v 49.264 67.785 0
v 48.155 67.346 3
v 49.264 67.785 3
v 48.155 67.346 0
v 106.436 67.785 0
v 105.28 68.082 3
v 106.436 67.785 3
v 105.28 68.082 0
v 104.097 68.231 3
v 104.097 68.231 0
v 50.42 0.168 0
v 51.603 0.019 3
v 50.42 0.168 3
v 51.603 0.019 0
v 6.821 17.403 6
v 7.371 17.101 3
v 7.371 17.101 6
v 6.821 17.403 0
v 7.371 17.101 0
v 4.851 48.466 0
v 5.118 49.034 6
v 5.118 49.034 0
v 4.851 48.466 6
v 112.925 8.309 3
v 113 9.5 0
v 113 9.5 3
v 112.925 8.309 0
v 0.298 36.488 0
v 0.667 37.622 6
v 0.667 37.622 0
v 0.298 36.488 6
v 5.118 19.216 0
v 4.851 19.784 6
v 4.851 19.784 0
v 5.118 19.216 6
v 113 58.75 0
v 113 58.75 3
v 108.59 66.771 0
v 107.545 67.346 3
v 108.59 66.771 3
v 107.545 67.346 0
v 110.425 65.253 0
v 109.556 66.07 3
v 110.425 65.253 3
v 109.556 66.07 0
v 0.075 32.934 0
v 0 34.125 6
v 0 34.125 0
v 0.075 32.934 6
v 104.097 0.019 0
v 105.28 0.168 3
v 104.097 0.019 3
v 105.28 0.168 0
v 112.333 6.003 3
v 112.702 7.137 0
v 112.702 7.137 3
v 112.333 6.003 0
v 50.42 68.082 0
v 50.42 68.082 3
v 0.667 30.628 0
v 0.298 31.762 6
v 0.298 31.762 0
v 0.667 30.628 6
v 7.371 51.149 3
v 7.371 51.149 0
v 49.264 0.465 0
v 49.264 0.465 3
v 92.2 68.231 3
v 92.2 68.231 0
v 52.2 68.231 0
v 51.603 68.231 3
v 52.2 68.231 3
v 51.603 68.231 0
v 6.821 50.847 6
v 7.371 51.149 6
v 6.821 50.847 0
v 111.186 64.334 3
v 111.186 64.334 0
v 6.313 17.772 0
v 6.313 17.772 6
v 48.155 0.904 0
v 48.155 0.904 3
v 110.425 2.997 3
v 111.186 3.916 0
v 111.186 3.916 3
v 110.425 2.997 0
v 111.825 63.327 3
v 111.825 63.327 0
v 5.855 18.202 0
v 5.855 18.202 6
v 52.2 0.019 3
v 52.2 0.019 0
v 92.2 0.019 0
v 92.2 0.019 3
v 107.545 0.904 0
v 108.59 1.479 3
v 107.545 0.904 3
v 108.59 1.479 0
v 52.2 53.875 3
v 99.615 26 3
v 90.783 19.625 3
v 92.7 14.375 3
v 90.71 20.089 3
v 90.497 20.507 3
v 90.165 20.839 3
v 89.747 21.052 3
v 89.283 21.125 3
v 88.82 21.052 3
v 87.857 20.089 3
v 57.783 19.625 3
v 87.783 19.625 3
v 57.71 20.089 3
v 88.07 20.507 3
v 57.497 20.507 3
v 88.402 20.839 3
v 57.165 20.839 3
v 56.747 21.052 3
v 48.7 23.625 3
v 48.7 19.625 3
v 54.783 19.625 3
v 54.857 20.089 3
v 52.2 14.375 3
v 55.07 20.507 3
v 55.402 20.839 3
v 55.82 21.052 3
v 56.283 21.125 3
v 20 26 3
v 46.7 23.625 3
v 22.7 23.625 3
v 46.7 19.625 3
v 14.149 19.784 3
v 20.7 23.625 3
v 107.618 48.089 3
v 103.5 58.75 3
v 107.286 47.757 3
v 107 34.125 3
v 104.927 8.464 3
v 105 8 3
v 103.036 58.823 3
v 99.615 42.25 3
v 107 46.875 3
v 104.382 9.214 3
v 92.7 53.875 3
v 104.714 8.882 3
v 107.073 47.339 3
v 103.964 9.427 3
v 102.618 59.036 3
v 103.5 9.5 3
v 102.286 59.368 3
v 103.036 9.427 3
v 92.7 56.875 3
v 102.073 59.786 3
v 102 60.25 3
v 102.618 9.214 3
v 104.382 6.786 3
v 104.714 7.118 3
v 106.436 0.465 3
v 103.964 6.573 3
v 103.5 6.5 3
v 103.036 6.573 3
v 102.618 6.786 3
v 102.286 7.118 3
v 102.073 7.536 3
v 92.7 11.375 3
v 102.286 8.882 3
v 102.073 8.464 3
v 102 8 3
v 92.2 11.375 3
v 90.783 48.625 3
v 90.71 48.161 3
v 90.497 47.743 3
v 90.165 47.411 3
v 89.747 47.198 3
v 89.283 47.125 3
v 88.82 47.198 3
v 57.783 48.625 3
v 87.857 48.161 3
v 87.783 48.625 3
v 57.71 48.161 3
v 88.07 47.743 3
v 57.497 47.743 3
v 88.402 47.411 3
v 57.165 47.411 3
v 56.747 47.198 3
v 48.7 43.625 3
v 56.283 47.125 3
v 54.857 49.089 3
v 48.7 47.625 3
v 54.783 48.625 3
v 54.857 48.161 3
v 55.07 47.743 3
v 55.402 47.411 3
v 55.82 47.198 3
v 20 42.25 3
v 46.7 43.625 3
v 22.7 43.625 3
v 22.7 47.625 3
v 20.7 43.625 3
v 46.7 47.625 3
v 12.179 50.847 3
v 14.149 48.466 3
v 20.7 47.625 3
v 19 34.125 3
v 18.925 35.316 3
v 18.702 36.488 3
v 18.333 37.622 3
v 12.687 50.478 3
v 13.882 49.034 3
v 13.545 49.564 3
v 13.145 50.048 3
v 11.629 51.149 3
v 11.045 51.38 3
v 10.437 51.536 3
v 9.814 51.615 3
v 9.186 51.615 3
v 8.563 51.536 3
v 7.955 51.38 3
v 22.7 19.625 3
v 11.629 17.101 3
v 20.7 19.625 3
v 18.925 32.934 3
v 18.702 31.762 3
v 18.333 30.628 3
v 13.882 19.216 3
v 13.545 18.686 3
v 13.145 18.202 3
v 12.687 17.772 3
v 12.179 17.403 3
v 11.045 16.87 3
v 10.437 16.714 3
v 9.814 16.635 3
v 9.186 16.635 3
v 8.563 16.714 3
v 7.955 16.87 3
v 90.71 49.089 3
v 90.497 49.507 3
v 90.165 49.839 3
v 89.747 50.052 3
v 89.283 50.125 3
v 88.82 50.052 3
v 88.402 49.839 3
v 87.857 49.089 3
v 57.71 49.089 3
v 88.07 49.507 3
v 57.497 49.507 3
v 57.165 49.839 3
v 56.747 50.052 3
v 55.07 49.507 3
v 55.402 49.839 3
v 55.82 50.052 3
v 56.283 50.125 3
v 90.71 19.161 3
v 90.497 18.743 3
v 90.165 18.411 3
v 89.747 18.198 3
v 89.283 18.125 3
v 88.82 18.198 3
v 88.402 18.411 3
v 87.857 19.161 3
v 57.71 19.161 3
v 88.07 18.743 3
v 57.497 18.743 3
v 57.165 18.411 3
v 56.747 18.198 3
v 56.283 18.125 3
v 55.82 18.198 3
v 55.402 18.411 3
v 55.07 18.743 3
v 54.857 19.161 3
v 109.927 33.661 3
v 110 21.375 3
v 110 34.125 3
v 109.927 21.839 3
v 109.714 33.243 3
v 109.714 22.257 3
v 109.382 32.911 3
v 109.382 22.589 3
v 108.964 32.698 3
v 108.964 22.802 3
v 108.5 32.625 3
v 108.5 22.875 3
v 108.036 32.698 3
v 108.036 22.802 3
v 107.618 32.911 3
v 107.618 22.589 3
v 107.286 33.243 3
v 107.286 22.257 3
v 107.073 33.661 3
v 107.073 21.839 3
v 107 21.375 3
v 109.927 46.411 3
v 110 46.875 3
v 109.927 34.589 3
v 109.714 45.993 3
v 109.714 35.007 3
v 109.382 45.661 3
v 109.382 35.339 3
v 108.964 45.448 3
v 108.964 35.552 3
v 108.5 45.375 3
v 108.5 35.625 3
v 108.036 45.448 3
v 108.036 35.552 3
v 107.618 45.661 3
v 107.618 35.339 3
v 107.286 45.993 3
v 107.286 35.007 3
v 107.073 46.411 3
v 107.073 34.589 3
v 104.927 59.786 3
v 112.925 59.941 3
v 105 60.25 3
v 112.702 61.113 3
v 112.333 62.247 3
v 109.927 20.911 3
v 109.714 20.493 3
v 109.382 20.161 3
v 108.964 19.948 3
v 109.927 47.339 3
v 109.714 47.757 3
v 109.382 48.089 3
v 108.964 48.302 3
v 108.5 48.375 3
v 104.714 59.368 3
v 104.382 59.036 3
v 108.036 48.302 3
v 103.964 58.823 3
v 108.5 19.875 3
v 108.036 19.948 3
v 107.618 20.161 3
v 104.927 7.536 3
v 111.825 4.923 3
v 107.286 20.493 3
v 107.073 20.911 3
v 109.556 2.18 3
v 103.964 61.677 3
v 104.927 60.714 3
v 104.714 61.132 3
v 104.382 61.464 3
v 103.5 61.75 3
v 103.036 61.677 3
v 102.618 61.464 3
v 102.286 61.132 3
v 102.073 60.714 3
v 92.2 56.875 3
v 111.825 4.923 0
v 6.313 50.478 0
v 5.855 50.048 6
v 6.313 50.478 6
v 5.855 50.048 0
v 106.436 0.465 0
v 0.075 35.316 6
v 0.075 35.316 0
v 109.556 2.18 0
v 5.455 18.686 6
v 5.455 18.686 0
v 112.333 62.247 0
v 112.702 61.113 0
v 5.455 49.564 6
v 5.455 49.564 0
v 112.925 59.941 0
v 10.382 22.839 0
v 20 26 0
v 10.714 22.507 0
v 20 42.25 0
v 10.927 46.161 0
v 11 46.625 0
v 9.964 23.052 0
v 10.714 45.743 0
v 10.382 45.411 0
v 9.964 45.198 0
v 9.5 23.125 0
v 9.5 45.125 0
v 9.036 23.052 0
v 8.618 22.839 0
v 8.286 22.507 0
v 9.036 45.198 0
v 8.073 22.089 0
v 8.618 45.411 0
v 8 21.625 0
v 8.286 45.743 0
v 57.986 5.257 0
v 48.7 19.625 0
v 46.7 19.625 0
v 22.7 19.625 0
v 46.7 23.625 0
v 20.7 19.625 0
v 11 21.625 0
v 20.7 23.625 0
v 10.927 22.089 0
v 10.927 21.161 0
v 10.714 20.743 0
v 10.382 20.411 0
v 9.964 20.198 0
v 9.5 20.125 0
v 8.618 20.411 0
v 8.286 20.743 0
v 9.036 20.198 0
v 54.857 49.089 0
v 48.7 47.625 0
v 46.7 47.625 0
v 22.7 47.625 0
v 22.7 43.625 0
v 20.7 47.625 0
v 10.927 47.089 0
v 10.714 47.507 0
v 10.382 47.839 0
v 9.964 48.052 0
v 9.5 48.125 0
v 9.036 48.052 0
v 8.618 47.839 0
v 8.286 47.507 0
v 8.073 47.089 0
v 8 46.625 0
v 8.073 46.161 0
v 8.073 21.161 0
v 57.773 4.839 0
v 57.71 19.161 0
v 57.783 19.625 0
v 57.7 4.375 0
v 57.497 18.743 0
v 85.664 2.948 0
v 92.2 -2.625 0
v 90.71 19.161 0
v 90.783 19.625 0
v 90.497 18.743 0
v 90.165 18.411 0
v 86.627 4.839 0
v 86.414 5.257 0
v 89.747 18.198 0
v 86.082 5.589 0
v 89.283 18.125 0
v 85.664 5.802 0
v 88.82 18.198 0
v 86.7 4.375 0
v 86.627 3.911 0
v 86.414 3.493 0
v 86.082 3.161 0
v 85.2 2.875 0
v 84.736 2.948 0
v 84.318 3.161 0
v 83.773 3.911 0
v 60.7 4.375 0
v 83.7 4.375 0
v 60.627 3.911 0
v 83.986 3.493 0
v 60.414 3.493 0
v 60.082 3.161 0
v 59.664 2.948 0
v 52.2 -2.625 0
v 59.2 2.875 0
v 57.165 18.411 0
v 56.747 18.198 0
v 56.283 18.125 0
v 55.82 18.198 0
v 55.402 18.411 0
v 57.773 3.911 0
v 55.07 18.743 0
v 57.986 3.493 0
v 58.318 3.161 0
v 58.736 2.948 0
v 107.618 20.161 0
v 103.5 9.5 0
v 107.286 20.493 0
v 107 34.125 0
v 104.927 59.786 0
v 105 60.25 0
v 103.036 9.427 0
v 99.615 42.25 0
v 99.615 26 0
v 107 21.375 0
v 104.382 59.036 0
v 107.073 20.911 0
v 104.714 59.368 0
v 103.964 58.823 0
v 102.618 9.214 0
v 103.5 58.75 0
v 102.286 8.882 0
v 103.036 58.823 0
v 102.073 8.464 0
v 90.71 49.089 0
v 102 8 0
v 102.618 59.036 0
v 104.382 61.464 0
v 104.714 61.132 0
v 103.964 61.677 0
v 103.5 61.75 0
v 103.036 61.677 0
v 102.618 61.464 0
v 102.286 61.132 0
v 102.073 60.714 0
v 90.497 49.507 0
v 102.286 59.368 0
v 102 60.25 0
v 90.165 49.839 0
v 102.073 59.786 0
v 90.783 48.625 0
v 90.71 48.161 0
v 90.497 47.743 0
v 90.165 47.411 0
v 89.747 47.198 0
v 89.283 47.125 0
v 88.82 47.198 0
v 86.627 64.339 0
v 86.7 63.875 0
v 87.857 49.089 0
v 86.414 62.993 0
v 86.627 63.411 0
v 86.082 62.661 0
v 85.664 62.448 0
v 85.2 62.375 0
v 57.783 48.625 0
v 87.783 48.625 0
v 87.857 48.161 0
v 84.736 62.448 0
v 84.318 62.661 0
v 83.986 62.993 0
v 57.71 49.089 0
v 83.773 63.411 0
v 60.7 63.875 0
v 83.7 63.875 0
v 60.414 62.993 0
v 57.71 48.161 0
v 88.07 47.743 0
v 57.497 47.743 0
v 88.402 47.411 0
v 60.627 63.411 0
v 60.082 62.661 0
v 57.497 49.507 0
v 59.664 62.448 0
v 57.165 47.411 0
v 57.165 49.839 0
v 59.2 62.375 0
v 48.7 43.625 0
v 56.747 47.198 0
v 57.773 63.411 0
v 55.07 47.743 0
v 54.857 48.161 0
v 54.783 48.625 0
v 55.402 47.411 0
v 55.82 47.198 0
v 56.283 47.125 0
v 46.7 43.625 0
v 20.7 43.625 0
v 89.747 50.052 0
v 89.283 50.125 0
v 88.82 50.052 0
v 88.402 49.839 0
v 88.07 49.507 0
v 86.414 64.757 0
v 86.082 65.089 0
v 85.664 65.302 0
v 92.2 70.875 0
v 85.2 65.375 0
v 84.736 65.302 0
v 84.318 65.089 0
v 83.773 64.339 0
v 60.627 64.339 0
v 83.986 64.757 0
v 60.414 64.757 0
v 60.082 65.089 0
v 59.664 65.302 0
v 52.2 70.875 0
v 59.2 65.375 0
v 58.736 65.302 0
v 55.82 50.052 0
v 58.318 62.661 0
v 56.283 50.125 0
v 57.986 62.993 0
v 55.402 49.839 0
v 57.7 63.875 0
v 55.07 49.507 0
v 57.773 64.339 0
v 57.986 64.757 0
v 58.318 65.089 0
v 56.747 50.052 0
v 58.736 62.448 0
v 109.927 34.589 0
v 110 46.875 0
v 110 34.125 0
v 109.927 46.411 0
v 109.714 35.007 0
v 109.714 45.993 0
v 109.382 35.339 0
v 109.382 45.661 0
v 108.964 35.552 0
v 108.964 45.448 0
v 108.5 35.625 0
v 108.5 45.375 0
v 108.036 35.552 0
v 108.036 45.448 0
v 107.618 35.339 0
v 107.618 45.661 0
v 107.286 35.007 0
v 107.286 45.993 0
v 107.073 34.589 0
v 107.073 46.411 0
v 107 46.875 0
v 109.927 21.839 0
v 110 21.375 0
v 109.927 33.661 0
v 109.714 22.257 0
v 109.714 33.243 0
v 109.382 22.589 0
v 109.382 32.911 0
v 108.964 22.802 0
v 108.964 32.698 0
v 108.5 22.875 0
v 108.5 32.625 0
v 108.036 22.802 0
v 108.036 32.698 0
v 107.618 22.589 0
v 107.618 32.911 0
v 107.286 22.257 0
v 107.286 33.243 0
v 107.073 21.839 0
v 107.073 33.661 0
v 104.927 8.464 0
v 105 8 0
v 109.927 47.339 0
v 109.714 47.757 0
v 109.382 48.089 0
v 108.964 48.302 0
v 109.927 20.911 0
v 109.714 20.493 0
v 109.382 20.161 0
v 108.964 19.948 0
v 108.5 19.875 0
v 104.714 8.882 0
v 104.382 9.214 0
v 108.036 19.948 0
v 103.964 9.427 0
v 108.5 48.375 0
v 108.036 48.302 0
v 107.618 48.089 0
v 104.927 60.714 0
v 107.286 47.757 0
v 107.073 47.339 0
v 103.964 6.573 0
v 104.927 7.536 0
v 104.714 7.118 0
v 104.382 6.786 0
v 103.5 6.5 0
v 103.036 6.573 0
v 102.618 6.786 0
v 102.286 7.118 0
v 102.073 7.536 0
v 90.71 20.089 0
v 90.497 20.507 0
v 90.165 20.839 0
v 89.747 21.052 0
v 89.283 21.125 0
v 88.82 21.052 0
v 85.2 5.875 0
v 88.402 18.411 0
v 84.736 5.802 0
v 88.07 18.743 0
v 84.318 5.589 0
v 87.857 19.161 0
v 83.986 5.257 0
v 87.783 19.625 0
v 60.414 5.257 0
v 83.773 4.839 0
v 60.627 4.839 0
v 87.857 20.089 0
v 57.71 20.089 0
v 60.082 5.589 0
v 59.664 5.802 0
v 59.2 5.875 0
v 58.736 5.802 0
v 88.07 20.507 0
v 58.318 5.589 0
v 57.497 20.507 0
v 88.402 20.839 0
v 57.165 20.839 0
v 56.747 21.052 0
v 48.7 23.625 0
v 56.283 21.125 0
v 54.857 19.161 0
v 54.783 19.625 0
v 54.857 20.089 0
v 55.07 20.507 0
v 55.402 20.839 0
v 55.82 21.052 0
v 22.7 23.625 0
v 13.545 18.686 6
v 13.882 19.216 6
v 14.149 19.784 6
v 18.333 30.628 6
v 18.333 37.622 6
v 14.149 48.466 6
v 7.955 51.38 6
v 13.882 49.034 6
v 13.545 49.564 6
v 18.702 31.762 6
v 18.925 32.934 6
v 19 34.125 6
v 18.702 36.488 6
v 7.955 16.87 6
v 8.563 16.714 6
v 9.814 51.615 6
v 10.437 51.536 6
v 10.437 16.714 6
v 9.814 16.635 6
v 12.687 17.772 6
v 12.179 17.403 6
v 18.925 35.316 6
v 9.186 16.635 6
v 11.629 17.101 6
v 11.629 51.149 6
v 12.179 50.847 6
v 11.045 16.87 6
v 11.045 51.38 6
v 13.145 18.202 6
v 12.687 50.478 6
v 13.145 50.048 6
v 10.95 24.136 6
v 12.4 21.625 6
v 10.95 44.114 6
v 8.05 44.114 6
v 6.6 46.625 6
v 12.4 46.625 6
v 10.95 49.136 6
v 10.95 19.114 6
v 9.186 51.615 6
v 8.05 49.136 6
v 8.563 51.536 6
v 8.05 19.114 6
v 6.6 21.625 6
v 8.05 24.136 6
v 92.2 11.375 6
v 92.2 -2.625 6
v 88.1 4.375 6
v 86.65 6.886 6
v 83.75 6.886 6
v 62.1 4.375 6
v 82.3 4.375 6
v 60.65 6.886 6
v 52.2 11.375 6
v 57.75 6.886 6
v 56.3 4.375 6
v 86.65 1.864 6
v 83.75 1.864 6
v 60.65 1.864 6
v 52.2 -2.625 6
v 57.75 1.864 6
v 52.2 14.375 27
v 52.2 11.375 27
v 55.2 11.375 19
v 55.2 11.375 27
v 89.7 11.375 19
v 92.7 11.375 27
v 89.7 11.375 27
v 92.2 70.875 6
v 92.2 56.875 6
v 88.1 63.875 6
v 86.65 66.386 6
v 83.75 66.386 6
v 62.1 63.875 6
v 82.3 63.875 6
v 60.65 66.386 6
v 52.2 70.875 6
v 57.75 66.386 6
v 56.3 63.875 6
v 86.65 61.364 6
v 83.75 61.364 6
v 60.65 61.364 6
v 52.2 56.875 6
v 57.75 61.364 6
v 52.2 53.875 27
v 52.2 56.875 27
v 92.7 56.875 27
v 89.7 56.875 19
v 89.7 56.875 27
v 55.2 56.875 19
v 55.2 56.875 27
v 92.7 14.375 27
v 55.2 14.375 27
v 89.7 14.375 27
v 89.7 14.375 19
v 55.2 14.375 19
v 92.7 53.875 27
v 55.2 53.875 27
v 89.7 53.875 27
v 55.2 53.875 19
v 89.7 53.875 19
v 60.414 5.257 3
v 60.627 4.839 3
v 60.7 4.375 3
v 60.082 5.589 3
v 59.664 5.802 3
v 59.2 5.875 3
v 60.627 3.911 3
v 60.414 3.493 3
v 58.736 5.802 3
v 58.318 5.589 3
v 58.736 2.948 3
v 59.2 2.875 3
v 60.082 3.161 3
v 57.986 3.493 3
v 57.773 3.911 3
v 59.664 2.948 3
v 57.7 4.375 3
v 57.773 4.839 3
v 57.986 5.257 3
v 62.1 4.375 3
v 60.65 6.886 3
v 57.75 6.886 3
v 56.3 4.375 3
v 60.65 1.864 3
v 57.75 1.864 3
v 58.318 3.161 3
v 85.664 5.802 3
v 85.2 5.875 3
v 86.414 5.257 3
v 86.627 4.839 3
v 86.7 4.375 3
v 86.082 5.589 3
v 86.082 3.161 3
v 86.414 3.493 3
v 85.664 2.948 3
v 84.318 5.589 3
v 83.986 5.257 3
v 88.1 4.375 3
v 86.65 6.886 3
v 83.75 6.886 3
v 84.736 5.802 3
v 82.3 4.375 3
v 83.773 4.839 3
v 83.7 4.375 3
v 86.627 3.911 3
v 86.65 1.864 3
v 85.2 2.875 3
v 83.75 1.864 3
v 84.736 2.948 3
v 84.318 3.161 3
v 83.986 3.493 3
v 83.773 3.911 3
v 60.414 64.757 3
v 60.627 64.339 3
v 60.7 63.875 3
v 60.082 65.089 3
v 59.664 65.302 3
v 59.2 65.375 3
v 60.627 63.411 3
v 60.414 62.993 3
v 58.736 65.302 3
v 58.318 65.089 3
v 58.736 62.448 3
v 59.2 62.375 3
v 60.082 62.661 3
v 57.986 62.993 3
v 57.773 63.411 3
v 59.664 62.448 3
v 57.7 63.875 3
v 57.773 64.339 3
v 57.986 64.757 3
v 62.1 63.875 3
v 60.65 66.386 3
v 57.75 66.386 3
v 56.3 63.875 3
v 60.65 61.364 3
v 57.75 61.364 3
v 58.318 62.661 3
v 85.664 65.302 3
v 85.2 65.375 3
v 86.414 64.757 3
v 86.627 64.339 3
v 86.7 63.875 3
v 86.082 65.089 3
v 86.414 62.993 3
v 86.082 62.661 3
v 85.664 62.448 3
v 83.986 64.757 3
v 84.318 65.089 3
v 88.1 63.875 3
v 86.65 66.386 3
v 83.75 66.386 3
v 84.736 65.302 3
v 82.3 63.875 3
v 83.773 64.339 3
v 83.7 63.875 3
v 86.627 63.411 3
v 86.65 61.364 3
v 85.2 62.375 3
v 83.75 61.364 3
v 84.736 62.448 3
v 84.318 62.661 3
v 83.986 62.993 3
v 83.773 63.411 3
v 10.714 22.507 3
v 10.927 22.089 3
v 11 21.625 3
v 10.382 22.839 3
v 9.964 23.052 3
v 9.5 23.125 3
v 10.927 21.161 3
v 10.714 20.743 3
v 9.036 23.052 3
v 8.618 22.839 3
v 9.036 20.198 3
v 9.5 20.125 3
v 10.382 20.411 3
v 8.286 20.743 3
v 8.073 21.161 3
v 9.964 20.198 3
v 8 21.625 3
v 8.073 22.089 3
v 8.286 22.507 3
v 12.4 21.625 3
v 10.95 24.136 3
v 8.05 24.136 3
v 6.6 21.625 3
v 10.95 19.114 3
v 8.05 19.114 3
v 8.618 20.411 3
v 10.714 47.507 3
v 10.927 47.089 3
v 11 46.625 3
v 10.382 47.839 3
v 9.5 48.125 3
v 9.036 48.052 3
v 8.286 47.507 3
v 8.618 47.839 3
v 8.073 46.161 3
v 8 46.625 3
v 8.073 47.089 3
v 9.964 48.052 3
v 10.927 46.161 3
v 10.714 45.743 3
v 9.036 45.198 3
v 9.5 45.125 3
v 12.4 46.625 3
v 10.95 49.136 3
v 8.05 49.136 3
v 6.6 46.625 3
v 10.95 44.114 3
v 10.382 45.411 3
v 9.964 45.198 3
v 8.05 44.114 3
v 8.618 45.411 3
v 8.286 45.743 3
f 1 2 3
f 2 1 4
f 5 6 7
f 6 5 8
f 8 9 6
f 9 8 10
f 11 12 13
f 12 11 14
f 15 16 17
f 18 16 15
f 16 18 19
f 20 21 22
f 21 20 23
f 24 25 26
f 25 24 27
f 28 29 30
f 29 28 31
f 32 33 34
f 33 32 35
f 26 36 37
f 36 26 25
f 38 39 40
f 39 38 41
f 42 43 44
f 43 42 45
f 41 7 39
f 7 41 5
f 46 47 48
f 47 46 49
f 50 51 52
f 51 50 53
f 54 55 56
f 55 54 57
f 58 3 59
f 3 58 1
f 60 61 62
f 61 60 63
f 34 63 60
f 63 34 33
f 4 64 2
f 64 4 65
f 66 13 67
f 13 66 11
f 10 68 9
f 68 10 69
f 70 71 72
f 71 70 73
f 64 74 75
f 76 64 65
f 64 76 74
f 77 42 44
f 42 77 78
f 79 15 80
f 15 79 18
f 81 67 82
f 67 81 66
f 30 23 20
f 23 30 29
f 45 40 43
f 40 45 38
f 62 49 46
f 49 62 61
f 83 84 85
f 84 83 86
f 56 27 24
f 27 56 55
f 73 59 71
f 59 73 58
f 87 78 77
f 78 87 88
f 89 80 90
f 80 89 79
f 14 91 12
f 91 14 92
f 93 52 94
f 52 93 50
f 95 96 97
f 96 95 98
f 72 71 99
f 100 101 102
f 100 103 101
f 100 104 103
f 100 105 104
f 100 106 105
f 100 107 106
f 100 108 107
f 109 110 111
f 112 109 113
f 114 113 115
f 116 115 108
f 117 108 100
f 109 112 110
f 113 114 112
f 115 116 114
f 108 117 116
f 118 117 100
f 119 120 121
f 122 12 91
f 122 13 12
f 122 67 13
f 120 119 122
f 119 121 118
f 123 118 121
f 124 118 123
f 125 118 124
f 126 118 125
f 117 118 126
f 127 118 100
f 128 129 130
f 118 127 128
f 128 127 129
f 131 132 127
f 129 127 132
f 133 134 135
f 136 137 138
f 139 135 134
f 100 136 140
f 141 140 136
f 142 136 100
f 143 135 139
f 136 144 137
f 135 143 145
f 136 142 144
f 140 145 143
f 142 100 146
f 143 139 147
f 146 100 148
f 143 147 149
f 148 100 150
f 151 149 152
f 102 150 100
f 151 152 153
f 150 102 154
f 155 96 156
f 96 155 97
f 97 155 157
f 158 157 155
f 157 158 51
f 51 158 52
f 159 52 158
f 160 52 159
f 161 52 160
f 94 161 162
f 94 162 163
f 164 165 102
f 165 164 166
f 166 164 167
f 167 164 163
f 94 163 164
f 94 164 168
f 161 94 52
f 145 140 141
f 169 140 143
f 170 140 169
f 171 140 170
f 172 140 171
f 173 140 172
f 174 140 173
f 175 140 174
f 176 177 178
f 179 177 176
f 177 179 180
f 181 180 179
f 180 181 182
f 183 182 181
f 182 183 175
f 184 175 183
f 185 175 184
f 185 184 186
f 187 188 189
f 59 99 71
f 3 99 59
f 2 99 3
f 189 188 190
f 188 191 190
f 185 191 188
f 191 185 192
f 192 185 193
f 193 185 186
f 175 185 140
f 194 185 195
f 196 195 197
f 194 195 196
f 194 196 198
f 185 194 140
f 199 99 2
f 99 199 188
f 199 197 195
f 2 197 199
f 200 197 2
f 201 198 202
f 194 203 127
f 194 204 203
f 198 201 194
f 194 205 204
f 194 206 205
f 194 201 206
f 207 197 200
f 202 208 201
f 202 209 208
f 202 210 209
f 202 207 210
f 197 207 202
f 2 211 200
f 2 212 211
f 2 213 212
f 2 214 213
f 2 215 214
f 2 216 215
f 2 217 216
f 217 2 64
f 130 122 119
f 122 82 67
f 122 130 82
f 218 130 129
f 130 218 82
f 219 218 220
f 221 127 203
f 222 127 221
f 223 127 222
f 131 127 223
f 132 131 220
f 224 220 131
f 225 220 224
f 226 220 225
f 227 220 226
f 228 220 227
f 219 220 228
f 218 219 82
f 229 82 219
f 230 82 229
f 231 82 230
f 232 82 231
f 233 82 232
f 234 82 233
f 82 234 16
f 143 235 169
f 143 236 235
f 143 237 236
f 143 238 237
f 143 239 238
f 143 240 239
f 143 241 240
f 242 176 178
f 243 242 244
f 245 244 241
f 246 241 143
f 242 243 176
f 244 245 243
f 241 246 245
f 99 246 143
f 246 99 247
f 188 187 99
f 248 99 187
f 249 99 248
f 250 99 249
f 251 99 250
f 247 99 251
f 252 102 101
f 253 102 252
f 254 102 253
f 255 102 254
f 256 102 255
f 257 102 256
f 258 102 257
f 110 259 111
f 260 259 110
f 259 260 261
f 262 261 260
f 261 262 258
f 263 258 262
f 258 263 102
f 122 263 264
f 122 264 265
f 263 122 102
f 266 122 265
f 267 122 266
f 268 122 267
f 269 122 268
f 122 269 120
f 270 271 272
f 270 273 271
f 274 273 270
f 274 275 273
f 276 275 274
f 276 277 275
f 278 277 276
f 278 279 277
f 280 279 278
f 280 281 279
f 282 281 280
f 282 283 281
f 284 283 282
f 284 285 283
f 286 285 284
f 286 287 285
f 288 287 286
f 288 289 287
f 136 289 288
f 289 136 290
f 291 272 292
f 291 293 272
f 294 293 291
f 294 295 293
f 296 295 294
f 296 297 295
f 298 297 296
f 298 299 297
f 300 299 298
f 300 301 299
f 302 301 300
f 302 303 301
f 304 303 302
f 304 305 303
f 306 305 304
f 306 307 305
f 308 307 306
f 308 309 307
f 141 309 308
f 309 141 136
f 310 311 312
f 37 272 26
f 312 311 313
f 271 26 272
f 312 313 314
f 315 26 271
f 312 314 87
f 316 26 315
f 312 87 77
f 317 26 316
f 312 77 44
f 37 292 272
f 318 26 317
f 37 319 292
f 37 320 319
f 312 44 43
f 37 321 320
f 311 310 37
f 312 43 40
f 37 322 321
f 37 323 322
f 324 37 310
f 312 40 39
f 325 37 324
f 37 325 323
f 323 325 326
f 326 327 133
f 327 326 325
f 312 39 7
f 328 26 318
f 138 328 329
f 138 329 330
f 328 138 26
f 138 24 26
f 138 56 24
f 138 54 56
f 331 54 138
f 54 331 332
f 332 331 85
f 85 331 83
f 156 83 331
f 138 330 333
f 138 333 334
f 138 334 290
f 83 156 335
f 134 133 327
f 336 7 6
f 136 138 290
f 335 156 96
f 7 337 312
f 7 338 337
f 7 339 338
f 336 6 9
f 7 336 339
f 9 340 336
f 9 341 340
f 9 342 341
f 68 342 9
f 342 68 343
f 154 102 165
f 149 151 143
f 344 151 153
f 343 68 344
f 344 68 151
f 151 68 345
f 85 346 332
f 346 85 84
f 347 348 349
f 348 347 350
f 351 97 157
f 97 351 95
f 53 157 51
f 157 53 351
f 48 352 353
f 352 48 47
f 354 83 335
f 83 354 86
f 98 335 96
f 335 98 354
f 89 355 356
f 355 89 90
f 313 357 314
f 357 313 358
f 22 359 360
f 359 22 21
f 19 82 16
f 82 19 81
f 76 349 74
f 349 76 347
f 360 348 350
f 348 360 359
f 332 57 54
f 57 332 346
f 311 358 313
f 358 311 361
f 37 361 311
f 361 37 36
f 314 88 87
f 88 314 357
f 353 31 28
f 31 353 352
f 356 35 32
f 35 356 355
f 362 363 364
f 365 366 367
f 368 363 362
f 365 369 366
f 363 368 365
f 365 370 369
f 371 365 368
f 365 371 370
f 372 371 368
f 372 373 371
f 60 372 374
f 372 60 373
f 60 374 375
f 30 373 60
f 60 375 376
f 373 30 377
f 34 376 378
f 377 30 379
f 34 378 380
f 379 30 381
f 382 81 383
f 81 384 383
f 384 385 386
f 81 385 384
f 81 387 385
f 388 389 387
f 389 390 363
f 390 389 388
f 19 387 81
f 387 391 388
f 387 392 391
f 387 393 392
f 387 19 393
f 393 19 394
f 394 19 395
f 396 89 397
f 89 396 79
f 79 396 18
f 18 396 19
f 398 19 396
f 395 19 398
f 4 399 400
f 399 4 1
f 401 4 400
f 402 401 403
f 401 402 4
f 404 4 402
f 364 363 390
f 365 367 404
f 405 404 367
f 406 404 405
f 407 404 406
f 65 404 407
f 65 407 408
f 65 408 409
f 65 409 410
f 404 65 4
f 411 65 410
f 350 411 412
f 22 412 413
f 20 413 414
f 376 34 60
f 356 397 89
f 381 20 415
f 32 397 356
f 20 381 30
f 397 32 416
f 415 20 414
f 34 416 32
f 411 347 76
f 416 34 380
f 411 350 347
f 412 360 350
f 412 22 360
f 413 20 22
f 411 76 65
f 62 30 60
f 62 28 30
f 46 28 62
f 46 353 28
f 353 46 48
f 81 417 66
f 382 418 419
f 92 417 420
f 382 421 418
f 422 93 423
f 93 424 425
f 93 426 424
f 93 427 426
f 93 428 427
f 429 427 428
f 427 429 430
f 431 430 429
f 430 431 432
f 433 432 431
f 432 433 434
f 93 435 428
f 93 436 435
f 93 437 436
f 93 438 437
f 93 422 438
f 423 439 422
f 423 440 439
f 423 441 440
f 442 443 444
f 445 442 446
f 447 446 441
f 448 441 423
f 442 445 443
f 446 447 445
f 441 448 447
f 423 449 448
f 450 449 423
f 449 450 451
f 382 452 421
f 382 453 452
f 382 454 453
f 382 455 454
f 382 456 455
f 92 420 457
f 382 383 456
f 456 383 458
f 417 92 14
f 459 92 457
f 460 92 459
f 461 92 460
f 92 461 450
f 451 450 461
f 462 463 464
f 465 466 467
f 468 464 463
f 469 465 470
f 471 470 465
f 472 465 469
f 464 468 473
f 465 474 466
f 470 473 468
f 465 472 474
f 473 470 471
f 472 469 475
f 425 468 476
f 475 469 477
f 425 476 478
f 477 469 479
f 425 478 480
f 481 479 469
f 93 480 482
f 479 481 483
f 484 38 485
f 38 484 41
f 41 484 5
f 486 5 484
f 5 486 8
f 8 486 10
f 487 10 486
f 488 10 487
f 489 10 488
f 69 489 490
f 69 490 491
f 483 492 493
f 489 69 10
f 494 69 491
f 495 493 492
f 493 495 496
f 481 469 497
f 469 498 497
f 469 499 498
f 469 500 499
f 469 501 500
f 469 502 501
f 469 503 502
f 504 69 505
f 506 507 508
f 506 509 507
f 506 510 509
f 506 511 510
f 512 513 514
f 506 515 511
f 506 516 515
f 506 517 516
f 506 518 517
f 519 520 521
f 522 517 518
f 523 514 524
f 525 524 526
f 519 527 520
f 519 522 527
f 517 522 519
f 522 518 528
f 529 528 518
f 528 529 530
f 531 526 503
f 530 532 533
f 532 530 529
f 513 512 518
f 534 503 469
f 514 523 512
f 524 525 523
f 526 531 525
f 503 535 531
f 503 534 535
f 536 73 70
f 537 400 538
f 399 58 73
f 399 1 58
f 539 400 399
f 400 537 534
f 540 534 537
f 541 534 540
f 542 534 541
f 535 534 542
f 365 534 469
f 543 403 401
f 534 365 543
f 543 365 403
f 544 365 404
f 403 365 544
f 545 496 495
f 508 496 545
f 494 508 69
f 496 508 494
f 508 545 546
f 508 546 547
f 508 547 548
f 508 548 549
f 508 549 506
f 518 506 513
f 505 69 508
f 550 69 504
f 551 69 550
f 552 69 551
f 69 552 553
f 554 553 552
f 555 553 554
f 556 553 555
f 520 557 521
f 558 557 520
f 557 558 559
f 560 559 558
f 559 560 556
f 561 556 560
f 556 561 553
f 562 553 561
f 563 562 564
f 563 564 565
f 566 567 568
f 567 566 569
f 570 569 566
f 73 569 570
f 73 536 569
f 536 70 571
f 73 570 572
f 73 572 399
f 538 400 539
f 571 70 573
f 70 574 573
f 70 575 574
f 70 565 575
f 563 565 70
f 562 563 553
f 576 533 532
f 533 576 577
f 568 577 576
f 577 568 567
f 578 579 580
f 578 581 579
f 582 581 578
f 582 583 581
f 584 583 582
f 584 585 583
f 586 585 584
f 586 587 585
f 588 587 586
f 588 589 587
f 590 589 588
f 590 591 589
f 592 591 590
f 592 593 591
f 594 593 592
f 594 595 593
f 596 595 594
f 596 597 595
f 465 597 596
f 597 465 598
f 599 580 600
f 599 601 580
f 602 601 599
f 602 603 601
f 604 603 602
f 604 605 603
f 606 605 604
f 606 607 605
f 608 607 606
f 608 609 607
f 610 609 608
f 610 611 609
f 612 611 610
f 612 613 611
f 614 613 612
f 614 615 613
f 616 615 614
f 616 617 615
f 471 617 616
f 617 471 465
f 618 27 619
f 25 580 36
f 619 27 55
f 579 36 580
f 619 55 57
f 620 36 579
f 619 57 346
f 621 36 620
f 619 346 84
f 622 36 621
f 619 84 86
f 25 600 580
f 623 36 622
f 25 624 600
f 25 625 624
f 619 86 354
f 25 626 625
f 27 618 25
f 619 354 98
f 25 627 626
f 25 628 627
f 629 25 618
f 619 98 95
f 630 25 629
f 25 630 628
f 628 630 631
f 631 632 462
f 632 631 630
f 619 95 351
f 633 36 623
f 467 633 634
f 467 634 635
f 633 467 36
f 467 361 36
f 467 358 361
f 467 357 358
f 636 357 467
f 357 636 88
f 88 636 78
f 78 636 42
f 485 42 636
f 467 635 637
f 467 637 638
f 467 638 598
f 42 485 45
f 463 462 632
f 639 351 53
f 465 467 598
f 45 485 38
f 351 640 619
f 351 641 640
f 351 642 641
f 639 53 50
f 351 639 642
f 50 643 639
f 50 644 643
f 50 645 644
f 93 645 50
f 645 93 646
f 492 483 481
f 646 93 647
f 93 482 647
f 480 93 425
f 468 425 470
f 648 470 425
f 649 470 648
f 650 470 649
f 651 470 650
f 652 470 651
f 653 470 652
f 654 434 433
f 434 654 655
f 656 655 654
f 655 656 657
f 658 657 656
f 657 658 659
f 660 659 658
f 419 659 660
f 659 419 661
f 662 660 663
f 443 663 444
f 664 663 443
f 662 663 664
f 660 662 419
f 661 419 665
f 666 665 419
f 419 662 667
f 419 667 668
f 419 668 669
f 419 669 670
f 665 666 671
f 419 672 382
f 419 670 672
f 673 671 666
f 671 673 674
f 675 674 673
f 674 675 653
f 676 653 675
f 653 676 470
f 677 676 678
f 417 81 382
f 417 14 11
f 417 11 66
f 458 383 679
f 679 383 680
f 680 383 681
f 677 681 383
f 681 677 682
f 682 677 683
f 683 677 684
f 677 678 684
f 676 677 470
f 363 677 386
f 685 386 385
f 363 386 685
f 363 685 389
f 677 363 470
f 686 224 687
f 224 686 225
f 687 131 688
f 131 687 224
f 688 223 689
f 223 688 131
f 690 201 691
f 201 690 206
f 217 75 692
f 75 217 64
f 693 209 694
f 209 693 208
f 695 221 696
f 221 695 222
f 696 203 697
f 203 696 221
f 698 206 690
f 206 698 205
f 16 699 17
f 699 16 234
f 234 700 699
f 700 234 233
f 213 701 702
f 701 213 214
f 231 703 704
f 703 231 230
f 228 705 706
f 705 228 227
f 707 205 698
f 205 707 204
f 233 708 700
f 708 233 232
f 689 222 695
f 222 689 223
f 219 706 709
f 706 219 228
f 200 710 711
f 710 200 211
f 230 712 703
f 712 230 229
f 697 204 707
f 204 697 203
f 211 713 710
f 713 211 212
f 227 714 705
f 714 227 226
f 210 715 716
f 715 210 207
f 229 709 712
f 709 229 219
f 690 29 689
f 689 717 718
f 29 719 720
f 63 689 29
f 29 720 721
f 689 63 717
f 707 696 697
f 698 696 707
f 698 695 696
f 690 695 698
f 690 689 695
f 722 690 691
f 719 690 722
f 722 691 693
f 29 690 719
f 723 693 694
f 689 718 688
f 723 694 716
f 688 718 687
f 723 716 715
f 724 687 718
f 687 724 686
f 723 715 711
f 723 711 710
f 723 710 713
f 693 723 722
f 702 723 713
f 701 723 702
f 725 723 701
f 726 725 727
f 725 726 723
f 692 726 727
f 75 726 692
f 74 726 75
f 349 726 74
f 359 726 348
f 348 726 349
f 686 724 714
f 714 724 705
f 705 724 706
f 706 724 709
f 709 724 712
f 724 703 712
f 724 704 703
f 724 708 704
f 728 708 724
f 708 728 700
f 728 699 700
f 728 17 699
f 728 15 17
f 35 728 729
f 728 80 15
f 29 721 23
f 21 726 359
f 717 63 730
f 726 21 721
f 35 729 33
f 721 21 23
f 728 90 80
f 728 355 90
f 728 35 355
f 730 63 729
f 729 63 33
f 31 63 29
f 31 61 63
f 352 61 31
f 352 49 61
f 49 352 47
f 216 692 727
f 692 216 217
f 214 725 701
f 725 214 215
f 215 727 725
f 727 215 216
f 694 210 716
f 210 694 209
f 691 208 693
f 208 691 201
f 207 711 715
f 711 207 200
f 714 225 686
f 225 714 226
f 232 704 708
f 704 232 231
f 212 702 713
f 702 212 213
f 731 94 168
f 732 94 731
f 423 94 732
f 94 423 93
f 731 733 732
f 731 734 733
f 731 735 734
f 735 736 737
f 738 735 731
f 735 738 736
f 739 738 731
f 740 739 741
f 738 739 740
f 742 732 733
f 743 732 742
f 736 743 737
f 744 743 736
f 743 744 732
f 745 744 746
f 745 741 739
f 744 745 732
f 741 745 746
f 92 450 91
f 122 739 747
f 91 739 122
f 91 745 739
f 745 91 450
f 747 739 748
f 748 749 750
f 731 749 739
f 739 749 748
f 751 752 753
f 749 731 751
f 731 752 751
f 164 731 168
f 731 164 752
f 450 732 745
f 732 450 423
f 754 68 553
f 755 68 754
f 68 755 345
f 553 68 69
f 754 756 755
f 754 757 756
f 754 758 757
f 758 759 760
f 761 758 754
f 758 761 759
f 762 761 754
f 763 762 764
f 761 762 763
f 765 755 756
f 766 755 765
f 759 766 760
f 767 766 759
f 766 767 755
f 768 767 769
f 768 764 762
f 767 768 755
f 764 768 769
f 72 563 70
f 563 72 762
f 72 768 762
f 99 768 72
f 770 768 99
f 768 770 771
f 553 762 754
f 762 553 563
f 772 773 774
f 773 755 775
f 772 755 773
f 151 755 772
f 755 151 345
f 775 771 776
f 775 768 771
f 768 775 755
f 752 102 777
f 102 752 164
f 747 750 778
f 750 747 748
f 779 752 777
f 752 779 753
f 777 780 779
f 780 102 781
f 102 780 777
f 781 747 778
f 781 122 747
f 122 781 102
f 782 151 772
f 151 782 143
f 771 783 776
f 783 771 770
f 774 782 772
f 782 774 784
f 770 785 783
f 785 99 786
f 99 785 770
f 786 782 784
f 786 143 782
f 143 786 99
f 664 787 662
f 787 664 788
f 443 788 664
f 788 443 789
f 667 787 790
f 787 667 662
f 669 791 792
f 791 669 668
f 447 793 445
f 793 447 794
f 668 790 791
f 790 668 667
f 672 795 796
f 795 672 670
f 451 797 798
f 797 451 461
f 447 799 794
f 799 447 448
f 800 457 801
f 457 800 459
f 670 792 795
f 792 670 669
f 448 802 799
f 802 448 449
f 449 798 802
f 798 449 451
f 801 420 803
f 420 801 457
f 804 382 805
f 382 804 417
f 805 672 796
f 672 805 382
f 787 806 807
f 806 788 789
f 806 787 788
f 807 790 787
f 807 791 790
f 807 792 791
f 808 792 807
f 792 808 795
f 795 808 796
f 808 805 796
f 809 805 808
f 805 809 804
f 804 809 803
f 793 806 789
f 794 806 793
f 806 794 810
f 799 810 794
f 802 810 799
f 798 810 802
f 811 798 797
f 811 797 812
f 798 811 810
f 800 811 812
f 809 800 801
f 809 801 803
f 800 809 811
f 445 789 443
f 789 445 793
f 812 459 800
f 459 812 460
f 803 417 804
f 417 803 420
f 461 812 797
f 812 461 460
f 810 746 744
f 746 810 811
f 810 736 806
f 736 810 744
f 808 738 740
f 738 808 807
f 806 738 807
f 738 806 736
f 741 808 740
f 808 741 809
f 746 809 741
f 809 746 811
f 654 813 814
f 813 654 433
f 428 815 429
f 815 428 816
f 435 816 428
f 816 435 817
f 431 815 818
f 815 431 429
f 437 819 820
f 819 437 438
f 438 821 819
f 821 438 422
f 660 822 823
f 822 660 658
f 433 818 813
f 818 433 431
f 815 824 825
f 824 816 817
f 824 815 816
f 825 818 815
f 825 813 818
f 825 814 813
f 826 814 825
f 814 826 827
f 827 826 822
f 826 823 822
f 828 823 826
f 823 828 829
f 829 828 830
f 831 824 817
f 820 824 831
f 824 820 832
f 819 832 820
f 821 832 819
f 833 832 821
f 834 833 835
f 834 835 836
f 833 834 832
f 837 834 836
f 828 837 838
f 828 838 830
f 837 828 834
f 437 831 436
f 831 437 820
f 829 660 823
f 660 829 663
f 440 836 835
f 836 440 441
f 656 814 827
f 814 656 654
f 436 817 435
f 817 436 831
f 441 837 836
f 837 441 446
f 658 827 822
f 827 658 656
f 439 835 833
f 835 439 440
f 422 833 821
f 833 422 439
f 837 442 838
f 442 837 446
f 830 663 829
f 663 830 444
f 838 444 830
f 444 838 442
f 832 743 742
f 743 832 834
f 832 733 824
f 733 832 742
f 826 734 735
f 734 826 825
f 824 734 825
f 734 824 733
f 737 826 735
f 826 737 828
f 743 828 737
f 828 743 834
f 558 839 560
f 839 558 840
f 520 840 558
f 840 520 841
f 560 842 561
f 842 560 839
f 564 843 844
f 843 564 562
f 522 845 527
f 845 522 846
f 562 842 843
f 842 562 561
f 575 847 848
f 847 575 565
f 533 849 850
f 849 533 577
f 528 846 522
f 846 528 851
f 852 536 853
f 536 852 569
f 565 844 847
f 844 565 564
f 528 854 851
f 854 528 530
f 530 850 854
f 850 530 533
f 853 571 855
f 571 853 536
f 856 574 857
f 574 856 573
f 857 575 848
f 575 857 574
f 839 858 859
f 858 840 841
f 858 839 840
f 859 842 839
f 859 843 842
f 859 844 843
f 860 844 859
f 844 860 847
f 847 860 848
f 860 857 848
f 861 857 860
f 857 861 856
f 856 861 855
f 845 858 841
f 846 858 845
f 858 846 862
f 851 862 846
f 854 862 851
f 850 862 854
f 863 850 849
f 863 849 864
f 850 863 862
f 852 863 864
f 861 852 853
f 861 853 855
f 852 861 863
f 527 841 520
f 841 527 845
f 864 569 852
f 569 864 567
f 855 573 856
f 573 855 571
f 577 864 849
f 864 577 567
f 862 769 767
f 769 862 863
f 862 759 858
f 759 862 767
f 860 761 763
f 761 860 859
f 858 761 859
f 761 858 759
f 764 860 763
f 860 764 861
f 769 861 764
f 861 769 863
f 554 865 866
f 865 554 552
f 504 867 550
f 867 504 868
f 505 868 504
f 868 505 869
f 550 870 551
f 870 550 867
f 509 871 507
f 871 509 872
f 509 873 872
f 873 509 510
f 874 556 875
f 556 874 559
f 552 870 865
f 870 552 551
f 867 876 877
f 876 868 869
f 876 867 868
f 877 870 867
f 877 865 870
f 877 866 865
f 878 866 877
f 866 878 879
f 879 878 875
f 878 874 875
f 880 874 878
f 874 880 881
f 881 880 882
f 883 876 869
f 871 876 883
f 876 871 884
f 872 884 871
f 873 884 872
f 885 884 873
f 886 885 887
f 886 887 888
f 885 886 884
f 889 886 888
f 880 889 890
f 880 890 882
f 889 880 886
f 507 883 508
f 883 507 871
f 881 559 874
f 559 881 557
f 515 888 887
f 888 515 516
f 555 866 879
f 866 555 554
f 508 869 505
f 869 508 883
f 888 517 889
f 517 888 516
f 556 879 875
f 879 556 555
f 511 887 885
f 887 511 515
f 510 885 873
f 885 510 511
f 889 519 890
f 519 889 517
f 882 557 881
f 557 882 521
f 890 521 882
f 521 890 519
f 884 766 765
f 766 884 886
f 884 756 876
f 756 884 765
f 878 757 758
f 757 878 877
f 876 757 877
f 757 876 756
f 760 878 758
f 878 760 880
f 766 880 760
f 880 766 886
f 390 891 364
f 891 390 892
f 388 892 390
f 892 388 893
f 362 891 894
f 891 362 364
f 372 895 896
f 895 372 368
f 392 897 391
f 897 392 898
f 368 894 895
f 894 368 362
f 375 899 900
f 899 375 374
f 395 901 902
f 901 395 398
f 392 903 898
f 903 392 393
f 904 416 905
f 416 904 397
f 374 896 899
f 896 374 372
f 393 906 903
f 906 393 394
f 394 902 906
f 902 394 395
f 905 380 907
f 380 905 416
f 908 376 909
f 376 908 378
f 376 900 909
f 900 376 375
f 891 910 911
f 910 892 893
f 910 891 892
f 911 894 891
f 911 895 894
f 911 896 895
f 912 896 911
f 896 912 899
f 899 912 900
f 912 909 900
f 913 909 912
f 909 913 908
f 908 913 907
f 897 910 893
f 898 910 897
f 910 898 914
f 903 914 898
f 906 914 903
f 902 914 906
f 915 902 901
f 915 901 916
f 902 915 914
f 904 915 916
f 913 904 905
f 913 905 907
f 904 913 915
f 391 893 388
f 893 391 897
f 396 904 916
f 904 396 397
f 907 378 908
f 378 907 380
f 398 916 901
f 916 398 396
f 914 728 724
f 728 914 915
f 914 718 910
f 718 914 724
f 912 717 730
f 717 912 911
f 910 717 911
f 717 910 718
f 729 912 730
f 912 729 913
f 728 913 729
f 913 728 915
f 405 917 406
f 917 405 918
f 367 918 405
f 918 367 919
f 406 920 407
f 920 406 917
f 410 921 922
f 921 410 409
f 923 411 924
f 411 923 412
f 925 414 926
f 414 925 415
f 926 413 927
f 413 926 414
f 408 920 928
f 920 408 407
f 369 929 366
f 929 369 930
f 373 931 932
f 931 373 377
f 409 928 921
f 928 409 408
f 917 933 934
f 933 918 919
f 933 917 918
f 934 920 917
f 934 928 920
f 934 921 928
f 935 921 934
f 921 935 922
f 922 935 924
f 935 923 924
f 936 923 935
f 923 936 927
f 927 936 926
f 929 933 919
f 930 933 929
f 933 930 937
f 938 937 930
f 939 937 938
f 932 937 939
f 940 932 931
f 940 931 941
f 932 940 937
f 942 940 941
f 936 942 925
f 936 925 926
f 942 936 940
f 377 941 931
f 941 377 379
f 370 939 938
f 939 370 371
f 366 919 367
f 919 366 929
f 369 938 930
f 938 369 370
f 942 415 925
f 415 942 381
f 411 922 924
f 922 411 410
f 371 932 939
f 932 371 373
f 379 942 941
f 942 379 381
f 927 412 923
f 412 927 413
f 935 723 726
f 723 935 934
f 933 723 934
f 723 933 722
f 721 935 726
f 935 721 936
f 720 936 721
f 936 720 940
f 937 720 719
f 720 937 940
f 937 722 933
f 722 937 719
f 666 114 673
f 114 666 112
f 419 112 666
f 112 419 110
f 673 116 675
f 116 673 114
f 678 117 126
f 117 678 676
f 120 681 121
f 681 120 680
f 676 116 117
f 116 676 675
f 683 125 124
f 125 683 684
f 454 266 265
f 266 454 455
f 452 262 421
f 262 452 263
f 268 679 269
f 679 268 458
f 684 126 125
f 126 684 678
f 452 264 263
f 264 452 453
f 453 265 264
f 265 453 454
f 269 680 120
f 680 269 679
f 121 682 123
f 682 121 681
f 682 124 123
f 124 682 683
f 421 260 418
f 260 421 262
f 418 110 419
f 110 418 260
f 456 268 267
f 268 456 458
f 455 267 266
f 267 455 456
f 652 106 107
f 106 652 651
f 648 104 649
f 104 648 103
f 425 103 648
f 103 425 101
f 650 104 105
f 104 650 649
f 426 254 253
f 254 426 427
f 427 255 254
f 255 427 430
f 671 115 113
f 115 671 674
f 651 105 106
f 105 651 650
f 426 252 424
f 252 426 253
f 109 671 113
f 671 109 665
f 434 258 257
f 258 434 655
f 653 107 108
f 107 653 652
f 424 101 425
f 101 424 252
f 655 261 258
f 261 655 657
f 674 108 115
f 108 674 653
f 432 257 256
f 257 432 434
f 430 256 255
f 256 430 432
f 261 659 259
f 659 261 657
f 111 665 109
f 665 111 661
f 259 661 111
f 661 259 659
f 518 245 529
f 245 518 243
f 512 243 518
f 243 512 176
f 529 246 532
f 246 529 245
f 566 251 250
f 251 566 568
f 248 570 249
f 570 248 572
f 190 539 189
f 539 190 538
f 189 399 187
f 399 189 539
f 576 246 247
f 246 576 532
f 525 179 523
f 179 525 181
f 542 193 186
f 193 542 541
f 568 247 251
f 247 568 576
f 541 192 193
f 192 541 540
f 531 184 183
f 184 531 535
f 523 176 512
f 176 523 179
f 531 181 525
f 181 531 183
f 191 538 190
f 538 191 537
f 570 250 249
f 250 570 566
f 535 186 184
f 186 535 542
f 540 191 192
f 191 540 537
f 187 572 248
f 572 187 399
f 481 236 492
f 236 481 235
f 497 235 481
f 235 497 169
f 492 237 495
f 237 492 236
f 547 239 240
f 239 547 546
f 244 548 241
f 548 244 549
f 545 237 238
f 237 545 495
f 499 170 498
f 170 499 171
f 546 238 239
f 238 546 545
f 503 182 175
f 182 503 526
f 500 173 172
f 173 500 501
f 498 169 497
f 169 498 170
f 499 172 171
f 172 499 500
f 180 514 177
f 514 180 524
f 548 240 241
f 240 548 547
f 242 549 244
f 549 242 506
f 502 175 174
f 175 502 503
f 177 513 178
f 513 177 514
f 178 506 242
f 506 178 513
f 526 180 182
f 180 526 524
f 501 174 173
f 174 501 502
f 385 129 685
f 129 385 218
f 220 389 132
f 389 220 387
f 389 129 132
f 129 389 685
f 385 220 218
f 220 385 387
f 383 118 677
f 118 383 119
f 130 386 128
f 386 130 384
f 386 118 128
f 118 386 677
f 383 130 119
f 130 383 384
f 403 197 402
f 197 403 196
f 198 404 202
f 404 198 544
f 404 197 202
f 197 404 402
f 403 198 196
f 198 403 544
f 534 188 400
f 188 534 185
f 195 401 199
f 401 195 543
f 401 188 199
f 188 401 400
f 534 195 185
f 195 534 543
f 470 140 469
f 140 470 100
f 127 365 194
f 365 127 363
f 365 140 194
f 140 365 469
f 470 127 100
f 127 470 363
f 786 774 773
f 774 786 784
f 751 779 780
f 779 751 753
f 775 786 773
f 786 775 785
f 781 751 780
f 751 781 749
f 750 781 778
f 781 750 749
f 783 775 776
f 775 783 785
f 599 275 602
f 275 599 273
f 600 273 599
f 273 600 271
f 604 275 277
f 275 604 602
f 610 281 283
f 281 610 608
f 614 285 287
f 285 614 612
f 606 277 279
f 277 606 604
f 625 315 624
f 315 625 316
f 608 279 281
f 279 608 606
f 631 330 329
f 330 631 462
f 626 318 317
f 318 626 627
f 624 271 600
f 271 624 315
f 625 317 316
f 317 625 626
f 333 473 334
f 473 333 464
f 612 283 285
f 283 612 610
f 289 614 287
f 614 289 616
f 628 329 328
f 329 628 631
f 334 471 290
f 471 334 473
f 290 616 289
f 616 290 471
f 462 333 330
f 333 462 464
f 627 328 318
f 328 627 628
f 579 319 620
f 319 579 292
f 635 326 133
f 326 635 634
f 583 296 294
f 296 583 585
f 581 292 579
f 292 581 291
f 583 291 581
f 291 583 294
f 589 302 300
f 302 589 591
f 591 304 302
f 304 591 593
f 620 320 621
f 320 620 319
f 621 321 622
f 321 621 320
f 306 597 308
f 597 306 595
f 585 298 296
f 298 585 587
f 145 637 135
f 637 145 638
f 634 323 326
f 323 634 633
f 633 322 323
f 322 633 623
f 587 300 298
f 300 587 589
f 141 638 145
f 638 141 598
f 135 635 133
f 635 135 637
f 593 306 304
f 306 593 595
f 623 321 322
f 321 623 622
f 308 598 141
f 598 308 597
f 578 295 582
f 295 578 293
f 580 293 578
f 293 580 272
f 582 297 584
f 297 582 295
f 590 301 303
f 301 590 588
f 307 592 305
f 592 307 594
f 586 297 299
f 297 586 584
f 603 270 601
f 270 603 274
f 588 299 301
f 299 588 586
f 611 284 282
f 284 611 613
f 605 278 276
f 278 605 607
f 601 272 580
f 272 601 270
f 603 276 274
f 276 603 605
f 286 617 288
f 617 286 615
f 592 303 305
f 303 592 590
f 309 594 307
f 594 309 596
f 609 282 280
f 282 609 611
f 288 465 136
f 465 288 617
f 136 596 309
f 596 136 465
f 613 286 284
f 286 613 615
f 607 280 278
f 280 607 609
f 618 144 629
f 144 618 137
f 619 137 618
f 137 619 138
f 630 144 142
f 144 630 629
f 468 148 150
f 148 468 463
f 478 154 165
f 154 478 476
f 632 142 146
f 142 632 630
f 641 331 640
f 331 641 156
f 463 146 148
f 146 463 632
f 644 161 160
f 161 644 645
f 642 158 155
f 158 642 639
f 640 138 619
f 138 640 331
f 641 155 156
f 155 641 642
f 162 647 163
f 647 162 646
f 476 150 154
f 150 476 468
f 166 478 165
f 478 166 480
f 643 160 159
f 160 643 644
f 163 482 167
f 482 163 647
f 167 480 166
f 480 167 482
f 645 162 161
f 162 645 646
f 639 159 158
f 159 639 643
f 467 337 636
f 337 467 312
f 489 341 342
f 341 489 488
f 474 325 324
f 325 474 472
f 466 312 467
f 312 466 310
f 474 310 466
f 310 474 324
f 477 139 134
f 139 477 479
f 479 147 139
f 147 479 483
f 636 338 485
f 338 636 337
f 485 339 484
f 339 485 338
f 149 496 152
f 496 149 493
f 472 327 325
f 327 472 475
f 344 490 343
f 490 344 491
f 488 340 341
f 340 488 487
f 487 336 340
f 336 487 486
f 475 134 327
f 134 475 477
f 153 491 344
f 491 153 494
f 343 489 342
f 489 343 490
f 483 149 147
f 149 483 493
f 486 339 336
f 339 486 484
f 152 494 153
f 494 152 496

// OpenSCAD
//Espesor paredes
espesor=3;

//porcas M3
radioPorcas=2.9;

//furados de M3
metrica=1.5;

//Dimensions Breadboard
XBreadboard=34.5;
YBreadboard=45.5;
ZBreadboard=9;

//Dimensions plataforma base
XBase=XBreadboard*3;
YBase=YBreadboard*1.5;
ZBase=espesor;
radioCirculos=19/2;
radioCirculosPequenosCaster=5;
separacionFuradosCaster=25;

//Dimensions soportes breadboard
XSoportes=XBreadboard+espesor*2;
YSoportes=espesor;
ZSoportes=24;

//Posición Breadboard
xBreadboard=XBase-XBreadboard*1.4;
yBreadboard=(YBase-YBreadboard)/2;
zBreadboard=ZSoportes+espesor-8;

//Dimensións resaltes
XResalte=40;
YResalte=14;
ZResalte=espesor*2;

//facer os furados do motor con oco para a porca OS FURADOS DO SOPORTE SON GRANDES, RADIO 2
module furadosMotor(){
	union(){
	cylinder(r=metrica, h=espesor,$fn=20);
	translate([0,0,espesor])cylinder(r=radioPorcas,h=espesor*2,$fn=6);
	}
	union(){
	translate ([26,0,0])  cylinder(r=1.5, h=espesor,$fn=20);
	translate([26,0,espesor])cylinder(r=radioPorcas,h=espesor*2,$fn=6);
	}
	}

module furadosCaster(){
	union(){
	cylinder(r=1.5, h=espesor,$fn=20);
	translate([0,0,espesor])cylinder(r=radioPorcas,h=espesor*2,$fn=6);
	}
	union(){
	translate ([0,separacionFuradosCaster,0])  cylinder(r=1.5, h=espesor,$fn=20);
	translate([0,separacionFuradosCaster,espesor])cylinder(r=radioPorcas,h=espesor*2,$fn=6);
	}
	}

module furadosDriver(){

	cylinder(r=1.5, h=espesor,$fn=20);
	translate ([33,0,0])  cylinder(r=1.5, h=espesor,$fn=20);
	translate ([0,29,0])  cylinder(r=1.5, h=espesor,$fn=20);
	translate ([33,29,0])  cylinder(r=1.5, h=espesor,$fn=20);
	}

module furadosPila(){
	cube([2,4,espesor]) ;
	translate ([26,0,0])  cube([2,4,espesor]);
	translate ([0,24,0])  cube([2,4,espesor]);
	translate ([26,24,0])  cube([2,4,espesor]);
	}

module resaltesMotor(){
	difference(){
		cube ([XResalte,YResalte,ZResalte]);
		}
	}

module resalteCaster(){
		hull(){
		cylinder(r=radioCirculos,h=ZResalte,$fn=50);
		translate ([0,separacionFuradosCaster/2,0]) cylinder(r=radioCirculosPequenosCaster,h=ZResalte,$fn=50);
		translate ([0,-separacionFuradosCaster/2,0]) cylinder(r=radioCirculosPequenosCaster,h=ZResalte,$fn=50);
		
		}
	}

module breadboard(){
	cube([XBreadboard,YBreadboard,ZBreadboard]);
	}



//base 
	difference(){
		union(){
				hull(){
				//soporteBallCaster
					translate ([radioCirculos,YBase/2,0]) cylinder(r=radioCirculos,h=espesor,$fn=50);
					translate ([radioCirculos,YBase/2+separacionFuradosCaster/2,0]) cylinder(r=radioCirculosPequenosCaster,h=espesor,$fn=50);
					translate ([radioCirculos,YBase/2-separacionFuradosCaster/2,0]) cylinder(r=radioCirculosPequenosCaster,h=espesor,$fn=50);
					translate ([XBase,radioCirculos,0]) cylinder(r=radioCirculos,h=espesor,$fn=50);
					translate ([XBase,YBase-radioCirculos,0]) cylinder(r=radioCirculos,h=espesor,$fn=50);
					translate ([xBreadboard-espesor,YBase-radioCirculos,0]) cylinder(r=radioCirculos,h=espesor,$fn=50);
					translate ([xBreadboard-espesor,radioCirculos,0]) cylinder(r=radioCirculos,h=espesor,$fn=50);					
				}
			//resaltes Ball Caster
			translate ([radioCirculos,YBase/2,0]) resalteCaster();
			
			
			//resaltes laterais
			translate([xBreadboard-espesor,yBreadboard-YResalte,0])resaltesMotor();
			translate([xBreadboard-espesor,yBreadboard+YBreadboard,0])resaltesMotor();
			
			//soportes breadboard
			translate([xBreadboard-espesor,yBreadboard,espesor])cube([XSoportes,espesor,ZSoportes]);
			translate([xBreadboard-espesor,yBreadboard+YBreadboard-espesor,espesor])cube([XSoportes,espesor,ZSoportes]);
		}

		//furados resaltes
		translate ([xBreadboard-espesor+(XResalte-26)/2,yBreadboard-YResalte+YResalte/2,0]) furadosMotor();
		translate ([xBreadboard-espesor+(XResalte-26)/2,yBreadboard+YBreadboard+YResalte/2,0]) furadosMotor();
		translate([radioCirculos,YBase/2-separacionFuradosCaster/2,0]) furadosCaster();
		//furados driver
		translate([xBreadboard-(XBreadboard/2-33/1.8),(YBase-29)/2,0]) furadosDriver();
		
		//furados pila
		translate ([XBase/5, (YBase-29)/2,0])furadosPila();
		
		//fendas ARRANXAR
		translate([20,(YBase-YBase/4.2)/2,0]) cube ([XBase/1.3,YBase/4.2,ZBase]);
		
		//Breadboard
		translate([xBreadboard,yBreadboard,zBreadboard]) breadboard();

		//furados frontais
			translate ([XBase+5,yBreadboard+10,0]) cylinder(r=1.5, h=espesor,$fn=20);
			translate ([XBase+5,yBreadboard+YBreadboard-10,0])  cylinder(r=1.5, h=espesor,$fn=20);
			translate ([XBase+5,YBase/2,0])  cylinder(r=1.5, h=espesor,$fn=20);
			translate ([XBase,8,0])  cylinder(r=1.5, h=espesor,$fn=20);
			translate ([XBase,YBase-8,0])  cylinder(r=1.5, h=espesor,$fn=20);


	}
